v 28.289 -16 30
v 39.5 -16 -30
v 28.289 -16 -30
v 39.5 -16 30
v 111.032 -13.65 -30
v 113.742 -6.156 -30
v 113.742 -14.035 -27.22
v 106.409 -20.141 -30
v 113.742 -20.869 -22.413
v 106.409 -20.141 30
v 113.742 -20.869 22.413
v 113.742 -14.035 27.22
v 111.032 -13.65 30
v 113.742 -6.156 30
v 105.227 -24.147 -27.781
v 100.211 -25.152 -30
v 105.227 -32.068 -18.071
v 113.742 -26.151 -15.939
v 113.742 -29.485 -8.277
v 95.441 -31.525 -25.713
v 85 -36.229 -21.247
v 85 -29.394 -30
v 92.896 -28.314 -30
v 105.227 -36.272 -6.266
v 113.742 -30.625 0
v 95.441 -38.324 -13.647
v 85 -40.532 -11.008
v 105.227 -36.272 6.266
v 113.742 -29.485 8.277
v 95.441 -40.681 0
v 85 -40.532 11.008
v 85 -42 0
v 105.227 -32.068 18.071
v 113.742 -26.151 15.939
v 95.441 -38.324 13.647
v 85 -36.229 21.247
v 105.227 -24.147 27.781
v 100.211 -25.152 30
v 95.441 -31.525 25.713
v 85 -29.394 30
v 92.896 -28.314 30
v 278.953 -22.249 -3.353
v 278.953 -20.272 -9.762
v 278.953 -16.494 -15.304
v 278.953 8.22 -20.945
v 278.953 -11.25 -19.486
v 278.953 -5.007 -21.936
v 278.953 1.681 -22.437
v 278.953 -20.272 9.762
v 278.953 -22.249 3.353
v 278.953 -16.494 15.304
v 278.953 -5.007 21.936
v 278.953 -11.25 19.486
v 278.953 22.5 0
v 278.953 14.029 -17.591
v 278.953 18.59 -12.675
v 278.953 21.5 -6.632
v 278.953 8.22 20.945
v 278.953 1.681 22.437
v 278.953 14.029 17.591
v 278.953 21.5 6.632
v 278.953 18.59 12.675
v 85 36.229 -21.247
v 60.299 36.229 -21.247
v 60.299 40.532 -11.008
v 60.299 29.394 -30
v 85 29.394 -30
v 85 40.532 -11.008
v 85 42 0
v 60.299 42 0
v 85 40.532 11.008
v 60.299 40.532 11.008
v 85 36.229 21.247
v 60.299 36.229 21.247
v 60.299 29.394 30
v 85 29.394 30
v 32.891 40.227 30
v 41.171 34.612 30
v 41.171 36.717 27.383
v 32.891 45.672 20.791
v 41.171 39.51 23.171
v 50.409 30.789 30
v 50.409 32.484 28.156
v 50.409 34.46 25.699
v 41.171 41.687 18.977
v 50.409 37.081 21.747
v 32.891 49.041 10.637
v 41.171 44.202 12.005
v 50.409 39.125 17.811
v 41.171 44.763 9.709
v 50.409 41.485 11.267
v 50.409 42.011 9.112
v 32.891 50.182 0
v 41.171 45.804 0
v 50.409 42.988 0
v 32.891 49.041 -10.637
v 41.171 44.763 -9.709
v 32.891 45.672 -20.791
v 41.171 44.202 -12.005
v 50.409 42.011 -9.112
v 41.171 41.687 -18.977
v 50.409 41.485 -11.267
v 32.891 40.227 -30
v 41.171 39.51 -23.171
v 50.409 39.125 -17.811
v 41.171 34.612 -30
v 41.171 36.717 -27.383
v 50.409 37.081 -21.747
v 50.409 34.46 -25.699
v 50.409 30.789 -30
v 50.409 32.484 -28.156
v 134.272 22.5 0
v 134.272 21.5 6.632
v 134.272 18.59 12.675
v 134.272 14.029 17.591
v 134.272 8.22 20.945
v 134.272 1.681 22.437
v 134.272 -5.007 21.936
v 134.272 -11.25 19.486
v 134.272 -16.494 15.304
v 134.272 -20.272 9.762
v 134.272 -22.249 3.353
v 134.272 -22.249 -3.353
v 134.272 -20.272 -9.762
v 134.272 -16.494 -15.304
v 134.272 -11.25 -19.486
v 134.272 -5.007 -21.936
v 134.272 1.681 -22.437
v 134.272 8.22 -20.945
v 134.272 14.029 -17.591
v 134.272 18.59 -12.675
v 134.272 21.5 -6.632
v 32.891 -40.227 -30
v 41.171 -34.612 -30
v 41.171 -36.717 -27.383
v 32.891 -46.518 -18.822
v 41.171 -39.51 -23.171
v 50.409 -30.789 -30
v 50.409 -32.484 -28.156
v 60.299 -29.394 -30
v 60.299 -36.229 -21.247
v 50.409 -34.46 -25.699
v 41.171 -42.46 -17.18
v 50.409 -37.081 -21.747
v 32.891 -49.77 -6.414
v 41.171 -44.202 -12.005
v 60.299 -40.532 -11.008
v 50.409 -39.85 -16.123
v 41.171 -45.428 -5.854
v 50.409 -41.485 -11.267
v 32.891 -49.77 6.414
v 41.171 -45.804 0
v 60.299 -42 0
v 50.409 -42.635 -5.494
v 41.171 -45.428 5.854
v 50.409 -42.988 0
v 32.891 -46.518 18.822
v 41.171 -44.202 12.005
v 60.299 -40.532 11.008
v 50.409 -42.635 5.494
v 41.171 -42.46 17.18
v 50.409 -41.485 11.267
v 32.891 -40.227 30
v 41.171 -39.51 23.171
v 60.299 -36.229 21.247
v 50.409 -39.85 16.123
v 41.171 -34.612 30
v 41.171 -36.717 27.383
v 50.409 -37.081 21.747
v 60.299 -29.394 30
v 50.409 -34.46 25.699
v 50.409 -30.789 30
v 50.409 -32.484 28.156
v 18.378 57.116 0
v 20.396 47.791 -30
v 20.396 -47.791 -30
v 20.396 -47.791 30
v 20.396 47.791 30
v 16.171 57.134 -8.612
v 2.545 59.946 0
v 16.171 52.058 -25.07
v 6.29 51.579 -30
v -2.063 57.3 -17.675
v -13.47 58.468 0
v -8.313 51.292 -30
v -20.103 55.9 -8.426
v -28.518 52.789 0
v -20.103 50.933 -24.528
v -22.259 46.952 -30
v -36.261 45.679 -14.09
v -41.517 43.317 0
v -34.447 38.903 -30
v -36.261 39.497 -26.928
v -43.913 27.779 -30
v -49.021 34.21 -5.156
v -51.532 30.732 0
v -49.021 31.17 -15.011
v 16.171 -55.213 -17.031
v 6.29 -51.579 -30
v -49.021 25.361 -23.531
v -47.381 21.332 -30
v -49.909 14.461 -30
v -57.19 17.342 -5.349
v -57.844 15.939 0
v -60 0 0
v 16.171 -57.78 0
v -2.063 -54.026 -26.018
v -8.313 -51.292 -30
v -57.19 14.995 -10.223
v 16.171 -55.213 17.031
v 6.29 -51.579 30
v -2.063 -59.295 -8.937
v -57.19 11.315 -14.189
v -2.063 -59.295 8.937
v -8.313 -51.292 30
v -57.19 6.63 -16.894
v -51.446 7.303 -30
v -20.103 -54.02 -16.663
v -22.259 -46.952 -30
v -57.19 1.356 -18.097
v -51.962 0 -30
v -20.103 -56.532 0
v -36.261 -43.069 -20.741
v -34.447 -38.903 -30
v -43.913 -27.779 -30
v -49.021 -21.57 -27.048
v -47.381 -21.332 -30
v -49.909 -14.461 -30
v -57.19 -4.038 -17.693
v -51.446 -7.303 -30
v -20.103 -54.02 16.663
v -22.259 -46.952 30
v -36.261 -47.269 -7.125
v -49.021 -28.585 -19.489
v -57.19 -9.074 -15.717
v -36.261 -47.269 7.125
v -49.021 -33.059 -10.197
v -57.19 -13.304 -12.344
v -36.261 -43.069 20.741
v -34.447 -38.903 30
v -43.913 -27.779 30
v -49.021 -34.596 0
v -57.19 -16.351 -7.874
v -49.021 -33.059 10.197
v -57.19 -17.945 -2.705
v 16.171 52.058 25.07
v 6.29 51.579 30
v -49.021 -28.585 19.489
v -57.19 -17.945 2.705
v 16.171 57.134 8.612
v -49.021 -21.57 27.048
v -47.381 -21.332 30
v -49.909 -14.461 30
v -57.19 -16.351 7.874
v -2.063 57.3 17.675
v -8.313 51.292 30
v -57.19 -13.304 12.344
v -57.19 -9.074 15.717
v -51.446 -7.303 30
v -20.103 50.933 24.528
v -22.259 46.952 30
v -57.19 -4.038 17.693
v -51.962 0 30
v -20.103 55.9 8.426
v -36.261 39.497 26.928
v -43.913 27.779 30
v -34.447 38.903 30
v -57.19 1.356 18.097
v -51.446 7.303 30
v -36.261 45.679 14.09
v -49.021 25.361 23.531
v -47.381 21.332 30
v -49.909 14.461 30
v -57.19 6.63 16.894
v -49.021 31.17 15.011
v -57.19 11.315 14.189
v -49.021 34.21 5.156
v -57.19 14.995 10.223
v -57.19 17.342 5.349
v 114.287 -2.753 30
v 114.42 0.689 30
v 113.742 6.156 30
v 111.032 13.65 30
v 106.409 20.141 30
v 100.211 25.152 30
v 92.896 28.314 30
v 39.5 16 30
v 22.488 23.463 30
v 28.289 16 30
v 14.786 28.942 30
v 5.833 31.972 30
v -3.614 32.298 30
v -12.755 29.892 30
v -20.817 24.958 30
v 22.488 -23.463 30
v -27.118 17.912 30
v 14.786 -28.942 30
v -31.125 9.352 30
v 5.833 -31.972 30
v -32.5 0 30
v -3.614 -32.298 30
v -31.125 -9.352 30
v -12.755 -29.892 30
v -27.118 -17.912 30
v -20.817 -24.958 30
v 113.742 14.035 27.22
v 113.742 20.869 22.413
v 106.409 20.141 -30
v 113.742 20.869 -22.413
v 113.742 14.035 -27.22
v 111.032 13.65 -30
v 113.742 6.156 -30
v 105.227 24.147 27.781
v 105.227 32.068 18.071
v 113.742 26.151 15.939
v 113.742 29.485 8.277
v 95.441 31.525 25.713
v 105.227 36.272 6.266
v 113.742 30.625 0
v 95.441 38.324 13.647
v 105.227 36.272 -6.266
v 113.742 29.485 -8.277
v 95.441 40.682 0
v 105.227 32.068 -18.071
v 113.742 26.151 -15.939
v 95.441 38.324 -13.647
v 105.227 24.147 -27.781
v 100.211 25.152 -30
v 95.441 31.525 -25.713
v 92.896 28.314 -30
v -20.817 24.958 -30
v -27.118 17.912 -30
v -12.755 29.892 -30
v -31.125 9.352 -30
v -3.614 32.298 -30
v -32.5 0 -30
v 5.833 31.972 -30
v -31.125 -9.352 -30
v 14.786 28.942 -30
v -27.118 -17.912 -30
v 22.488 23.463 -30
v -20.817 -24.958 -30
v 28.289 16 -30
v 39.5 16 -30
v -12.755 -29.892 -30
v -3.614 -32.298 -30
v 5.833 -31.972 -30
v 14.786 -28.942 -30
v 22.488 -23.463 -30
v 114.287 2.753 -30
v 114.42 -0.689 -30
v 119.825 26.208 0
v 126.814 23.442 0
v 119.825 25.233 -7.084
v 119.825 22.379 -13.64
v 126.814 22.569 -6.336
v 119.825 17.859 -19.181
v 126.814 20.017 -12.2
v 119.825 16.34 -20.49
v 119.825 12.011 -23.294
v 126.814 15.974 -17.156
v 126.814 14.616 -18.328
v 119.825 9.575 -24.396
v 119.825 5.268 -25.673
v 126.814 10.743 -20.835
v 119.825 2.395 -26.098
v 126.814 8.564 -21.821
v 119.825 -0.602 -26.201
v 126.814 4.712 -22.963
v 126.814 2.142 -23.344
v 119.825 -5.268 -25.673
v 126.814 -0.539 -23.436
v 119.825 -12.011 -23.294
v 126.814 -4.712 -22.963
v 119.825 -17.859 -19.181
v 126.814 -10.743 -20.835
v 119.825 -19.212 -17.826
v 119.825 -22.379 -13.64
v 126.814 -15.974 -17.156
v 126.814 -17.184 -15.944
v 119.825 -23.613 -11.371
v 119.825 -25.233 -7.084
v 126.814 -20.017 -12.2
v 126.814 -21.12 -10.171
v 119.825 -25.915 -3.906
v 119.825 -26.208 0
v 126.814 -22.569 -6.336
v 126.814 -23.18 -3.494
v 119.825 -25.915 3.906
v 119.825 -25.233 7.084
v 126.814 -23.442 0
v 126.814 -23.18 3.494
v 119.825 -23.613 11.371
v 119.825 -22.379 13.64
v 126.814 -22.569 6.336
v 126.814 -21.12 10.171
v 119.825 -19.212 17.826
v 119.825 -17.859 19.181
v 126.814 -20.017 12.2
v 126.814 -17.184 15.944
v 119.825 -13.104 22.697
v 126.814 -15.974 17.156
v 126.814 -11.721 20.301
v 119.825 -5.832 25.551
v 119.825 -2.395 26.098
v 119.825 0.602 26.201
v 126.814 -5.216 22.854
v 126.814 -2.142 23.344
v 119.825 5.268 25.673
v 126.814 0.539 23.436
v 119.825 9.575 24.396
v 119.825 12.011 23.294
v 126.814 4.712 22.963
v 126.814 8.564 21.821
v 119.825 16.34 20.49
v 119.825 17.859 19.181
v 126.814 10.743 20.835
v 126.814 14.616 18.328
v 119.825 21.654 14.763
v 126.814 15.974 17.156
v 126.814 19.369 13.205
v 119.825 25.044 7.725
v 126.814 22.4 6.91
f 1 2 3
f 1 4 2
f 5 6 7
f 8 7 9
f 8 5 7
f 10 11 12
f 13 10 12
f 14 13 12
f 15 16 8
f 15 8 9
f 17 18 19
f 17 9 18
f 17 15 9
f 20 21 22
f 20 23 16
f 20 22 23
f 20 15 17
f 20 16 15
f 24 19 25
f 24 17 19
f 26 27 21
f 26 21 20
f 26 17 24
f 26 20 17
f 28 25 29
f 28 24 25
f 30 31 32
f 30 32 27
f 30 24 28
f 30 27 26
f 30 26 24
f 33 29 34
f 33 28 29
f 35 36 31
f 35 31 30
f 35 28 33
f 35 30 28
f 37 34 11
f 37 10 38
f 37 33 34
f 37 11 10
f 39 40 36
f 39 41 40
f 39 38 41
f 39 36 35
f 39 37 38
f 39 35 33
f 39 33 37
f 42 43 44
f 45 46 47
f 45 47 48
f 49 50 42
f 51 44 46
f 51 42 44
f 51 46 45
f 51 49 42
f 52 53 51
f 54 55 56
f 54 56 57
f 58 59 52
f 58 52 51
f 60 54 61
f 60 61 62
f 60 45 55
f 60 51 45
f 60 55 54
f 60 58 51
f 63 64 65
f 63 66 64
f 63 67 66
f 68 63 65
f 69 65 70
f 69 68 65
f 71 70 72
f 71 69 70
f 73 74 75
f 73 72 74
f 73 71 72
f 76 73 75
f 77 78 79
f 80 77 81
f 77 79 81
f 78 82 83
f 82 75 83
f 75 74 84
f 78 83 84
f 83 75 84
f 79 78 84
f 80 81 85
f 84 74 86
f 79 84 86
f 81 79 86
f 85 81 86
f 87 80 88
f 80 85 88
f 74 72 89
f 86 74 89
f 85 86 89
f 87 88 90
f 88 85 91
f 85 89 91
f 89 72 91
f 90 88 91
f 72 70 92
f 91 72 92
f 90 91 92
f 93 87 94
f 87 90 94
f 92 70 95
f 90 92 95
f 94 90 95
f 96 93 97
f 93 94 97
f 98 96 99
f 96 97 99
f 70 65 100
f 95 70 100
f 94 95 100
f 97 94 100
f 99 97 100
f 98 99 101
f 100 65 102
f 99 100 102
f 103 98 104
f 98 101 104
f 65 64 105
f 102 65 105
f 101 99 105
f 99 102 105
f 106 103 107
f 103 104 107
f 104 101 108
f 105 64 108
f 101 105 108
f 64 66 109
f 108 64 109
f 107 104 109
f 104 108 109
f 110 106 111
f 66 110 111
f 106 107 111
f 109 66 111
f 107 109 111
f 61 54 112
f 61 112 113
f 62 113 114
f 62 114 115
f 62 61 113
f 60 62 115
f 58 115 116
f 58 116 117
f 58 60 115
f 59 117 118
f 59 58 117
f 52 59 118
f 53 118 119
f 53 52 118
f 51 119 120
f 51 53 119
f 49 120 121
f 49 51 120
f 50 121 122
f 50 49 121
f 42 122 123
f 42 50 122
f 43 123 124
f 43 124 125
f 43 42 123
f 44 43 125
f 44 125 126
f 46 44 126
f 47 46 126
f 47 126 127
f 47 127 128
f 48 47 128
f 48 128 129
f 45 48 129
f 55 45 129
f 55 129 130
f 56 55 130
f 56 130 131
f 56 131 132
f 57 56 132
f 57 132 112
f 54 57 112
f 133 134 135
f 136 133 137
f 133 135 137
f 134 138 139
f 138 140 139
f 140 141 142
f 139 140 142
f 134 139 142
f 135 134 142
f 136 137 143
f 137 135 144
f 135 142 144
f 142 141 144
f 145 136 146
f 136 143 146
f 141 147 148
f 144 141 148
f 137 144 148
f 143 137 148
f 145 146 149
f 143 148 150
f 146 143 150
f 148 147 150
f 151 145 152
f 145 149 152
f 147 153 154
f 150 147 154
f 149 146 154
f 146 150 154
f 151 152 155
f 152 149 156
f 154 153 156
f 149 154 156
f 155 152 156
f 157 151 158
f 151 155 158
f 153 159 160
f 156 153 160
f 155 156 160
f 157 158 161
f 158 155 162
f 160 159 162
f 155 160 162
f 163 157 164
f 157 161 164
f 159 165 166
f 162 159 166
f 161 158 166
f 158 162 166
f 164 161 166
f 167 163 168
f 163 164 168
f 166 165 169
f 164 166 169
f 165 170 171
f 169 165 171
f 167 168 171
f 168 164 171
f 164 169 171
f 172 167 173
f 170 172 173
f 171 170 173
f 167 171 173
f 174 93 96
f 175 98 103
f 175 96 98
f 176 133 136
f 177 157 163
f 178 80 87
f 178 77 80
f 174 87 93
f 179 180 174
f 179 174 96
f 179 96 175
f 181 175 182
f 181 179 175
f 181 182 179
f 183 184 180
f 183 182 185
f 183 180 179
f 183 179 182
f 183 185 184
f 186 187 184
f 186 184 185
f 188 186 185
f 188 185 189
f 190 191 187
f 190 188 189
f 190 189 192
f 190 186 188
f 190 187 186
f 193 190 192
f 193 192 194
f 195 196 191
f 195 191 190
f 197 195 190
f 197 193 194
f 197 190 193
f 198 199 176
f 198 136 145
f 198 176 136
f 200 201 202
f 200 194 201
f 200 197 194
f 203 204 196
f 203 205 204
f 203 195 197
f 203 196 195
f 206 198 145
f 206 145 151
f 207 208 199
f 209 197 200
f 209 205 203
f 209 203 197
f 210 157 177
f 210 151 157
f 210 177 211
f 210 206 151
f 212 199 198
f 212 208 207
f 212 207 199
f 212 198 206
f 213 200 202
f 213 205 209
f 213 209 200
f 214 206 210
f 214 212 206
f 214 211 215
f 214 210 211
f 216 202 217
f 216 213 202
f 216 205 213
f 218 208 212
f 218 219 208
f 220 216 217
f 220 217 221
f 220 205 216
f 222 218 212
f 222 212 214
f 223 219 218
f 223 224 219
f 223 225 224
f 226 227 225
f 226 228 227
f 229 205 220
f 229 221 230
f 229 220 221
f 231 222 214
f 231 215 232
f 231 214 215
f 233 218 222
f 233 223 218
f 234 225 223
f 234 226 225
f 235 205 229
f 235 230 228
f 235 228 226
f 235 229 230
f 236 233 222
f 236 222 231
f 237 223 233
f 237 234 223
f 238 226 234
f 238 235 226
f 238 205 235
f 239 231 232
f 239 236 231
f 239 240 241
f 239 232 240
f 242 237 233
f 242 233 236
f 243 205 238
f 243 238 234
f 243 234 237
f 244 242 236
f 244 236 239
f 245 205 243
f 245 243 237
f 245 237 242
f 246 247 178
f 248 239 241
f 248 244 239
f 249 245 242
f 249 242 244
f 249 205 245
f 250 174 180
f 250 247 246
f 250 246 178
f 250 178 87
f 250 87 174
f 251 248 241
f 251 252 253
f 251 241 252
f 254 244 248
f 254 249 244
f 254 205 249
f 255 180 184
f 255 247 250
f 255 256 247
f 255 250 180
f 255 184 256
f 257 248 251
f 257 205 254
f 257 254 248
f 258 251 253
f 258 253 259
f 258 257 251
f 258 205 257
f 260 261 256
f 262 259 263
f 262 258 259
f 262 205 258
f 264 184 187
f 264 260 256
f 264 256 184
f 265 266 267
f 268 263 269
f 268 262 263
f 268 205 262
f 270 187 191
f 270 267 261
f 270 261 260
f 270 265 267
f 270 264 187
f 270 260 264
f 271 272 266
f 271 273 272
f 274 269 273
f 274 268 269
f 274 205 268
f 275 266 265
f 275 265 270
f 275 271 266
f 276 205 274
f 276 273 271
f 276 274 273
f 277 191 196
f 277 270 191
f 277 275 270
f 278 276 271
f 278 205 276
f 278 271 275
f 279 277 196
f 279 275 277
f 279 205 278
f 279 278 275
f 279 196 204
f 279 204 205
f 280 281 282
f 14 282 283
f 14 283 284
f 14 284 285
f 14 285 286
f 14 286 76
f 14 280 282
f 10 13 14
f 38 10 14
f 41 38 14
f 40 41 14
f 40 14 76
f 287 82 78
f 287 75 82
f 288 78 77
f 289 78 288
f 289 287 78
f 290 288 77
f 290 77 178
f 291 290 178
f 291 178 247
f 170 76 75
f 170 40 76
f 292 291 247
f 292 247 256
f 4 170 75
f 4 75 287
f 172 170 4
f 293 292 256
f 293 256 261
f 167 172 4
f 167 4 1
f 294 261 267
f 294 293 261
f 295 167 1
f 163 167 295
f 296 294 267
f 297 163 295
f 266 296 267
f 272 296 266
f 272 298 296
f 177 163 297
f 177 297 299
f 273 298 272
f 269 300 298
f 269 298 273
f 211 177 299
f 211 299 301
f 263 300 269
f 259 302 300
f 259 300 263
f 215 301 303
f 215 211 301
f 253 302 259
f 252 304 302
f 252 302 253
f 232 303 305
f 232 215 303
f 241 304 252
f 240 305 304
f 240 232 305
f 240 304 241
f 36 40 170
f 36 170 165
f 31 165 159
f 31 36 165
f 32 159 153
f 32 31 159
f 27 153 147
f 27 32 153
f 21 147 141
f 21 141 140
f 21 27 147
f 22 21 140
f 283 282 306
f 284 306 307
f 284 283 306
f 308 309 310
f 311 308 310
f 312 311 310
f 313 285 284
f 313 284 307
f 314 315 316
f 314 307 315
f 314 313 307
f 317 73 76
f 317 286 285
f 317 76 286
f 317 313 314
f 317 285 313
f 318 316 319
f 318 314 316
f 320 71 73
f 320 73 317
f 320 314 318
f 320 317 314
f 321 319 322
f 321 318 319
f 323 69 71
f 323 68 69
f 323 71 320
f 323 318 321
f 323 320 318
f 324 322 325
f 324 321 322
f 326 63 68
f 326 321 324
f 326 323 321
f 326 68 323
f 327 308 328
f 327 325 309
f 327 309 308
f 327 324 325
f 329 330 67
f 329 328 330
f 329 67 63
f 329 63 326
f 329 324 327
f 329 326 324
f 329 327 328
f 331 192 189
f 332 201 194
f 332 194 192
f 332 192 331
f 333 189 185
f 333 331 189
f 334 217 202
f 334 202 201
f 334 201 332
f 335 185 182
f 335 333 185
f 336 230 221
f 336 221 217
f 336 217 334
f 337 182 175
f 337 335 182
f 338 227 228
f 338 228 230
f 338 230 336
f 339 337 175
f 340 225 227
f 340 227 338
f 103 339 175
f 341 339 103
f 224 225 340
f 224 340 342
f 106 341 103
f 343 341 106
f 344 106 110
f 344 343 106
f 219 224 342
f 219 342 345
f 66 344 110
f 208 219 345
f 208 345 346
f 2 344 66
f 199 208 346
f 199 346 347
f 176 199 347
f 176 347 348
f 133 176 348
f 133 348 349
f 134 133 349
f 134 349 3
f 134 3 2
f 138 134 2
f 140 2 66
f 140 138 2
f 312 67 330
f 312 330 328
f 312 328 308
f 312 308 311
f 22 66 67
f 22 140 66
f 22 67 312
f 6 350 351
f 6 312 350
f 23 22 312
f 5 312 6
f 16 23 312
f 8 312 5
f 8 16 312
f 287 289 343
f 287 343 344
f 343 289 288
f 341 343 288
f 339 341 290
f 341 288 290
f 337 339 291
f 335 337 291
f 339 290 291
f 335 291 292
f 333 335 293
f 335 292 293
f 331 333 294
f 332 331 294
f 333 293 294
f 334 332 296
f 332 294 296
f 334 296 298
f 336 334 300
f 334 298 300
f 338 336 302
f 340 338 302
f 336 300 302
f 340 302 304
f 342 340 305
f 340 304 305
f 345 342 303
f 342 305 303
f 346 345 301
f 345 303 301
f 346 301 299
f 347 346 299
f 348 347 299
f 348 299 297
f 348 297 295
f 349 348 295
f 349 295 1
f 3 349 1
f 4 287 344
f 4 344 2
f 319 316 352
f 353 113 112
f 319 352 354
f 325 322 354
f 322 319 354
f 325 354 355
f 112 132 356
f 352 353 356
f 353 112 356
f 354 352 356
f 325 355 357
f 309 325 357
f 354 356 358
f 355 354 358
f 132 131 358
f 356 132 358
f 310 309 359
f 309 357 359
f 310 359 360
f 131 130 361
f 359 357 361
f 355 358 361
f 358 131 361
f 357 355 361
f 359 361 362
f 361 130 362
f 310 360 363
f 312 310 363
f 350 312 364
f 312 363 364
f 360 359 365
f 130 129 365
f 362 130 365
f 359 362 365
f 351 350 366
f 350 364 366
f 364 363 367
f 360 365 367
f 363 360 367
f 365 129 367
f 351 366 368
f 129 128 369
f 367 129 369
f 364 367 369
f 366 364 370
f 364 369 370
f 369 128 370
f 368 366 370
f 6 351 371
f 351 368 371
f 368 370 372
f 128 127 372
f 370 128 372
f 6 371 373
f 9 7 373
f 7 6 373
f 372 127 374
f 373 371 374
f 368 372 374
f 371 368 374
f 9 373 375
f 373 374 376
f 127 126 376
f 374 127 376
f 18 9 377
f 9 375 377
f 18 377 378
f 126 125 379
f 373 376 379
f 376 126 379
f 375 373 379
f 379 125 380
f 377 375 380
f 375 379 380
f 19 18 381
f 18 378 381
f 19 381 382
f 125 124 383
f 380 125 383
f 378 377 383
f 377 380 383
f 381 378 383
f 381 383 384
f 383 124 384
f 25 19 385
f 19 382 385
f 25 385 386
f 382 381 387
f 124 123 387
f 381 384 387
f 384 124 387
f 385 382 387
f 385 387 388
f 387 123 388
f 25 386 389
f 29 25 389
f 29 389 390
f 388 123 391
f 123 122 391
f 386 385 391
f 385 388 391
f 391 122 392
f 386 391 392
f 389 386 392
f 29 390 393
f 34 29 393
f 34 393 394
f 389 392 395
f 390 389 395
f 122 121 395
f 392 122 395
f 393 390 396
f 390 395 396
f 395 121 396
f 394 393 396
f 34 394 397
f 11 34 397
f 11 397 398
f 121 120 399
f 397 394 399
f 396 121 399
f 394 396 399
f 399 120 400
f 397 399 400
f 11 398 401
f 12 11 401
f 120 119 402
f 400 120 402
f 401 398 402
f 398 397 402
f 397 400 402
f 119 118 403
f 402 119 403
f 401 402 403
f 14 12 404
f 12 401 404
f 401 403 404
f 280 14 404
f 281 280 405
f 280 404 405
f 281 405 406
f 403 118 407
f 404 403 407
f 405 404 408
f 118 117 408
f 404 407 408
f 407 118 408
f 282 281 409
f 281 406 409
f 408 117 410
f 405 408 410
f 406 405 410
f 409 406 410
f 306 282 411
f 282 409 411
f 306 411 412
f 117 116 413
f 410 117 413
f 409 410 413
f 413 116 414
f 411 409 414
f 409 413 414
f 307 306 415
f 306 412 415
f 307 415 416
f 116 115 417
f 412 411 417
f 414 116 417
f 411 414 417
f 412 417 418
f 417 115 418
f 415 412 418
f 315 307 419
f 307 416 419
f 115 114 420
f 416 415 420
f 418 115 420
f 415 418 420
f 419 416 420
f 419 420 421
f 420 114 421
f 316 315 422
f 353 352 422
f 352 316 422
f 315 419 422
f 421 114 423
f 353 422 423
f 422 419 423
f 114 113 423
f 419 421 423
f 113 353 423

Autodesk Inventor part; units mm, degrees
ref_plane "YZ Plane" through (0, 0, 0) normal (1, 0, 0) x (0, 1, 0)
ref_plane "XZ Plane" through (0, 0, 0) normal (0, 1, 0) x (-1, 0, 0)
ref_plane "XY Plane" through (0, 0, 0) normal (0, 0, 1) x (1, 0, 0)
sketch "Эскиз1" plane through (0, 0, 0) normal (0, 0, 1) x (1, 0, 0)
  circle A0 centre (0, 0) radius 60
  circle A1 centre (0, 0) radius 32.5
  line L0 (28.2887, 16) -> (28.2887, -16)
  line L1 (28.2887, 16) -> (39.5, 16)
  line L2 (39.5, 16) -> (39.5, -16)
  line L3 (39.5, -16) -> (28.2887, -16)
  line L4 (-60, 0) -> (279.451, 0)
  line L5 (42.8486, 42) -> (42.8486, -42)
  line L6 (42.8486, 42) -> (85, 42)
  line L7 (85, 42) -> (85, -42)
  line L8 (85, -42) -> (42.8486, -42)
  line L9 (42.8486, -42) -> (42.8486, 42)
  circle A2 centre (60.2993, 92) radius 50
  line L10 (0, 0) -> (60.2993, 92)
  circle A3 centre (85, 0) radius 42
  line L11 (85, 22.5) -> (278.9533, 22.5)
  line L12 (278.9533, 22.5) -> (278.9533, -22.5)
  line L13 (278.9533, -22.5) -> (85, -22.5)
  line L14 (85, -22.5) -> (85, 22.5)
  circle A4 centre (134.2722, 52.5) radius 30
  line L15 (85, 0) -> (134.2722, 52.5)
  point P0 (-32.5, 0)
  point P1 (278.9533, 0)
  point P2 (278.9533, 0)
  point P3 (134.2722, 22.5)
  point P4 (113.7421, 30.625)
  point P5 (60.2993, 42)
  point P6 (32.8905, 50.1818)
  dimension "d17" = 84
  dimension "d0" = 120
  dimension "d1" = 65
  dimension "d2" = 32
  dimension "d3" = 72
  dimension "d4" = 84
  dimension "d7" = 100
  dimension "d8" = 92
  dimension "d10" = 110
  dimension "d11" = 85
  dimension "d12" = 0
  dimension "d13" = 45
  dimension "d14" = 60
  dimension "d15" = 52.5
  dimension "d16" = 72
  dimension "d18" = 0
revolve "Вращение1" add sketch "Эскиз1" angle 360 about axis through (-60, 0, 0) along (1, 0, 0) picked at (45.8038, 26.0598) picked at (54.3043, 5.6582) picked at (76.4143, 10.6672) picked at (29.0608, 8.9784) contours A0 L10 A1 L4 | A2 L6 A0 | A0 L5 L4 L2 L1 A1 L10 | A1 L10 L4 | L5 A0 A3 L4 | L6 A3 A0 | A1 L0 L4 L10 | L4 A3 A0 | A0 A3 L7 L4 | L4 A1 L1 L2 | A3 L15 L11 L7 | A1 L4 L0 | L15 L11 A3 L4 | L7 L11 L15 | A3 L11 L12 L4 | A4 L11 A3 | A3 L11 L15
sketch "Эскиз2" plane through (0, 0, 0) normal (0, 1, 0) x (-1, 0, 0)
  line L0 (105.3756, -30) -> (-295.1428, -30)
  line L1 (-295.1428, -30) -> (-295.1428, 30)
  line L2 (-295.1428, 30) -> (105.3756, 30)
  line L3 (105.3756, 30) -> (105.3756, -30)
  point P0 (0, 0)
  point P1 (105.3756, 0)
  point P2 (0, 0)
  dimension "d20" = 0
  dimension "d21" = 60
extrude "Выдавливание1" cut sketch "Эскиз2" along normal mid plane 200 keep common part
sketch "Эскиз3" plane through (60.2993, -29.3939, 30) normal (0, 0, 1) x (1, 0, 0)
  circle A0 centre (-60.2993, 29.3939) radius 32.5
  line L0 (-32.0106, 13.3939) -> (-32.0106, 45.3939)
  line L1 (-32.0106, 45.3939) -> (-20.7993, 45.3939)
  line L2 (-20.7993, 45.3939) -> (-20.7993, 13.3939)
  line L3 (-20.7993, 13.3939) -> (-32.0106, 13.3939)
  line L4 (-32.0106, 13.3939) -> (-32.0106, 45.3939)
  point P0 (-92.7993, 29.3939)
  point P1 (-32.0106, 13.3939)
  dimension "d24" = 65
  dimension "d25" = 32
  dimension "d26" = 72
extrude "Выдавливание2" cut sketch "Эскиз3" against normal blind 100
properties part number "1_3"
